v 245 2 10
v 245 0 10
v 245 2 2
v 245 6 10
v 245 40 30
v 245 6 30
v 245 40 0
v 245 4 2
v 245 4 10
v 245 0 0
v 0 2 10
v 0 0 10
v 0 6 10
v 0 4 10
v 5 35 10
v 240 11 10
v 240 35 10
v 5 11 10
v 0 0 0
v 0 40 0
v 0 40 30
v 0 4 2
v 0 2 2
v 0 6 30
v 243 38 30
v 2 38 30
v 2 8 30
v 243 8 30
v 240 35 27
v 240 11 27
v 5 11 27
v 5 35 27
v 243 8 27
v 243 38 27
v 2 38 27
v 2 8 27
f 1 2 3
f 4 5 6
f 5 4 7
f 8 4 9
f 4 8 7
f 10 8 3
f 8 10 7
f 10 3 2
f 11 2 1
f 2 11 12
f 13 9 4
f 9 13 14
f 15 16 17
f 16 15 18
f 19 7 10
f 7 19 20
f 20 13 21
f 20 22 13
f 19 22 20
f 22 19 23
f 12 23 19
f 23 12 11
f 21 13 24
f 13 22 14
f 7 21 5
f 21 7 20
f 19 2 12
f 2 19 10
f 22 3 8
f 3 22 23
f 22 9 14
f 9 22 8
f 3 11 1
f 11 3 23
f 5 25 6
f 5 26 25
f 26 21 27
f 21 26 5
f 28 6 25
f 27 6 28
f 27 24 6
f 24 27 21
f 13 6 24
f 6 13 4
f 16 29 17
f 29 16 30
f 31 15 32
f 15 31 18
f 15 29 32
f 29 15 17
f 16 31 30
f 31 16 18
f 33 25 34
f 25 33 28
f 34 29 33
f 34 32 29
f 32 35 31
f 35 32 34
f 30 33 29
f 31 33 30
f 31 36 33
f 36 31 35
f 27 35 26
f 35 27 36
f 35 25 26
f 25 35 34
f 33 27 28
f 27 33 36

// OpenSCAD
WideX=245;
DepthY=40;
HeightZ=10;
Thick=2;
Buff=1;
BoxH=30;
Wall=5;
Brim=2;
DBR=Brim*2;
Conn=Thick*3;

LidZ=3;
LidX=WideX-DBR;
LidY=DepthY-DBR-Conn;

DW=Wall*2;
DB=Buff*2;

difference()
{
  cube([WideX,DepthY,HeightZ]);
  translate([-Buff,Thick,Thick]) cube([WideX+DB,Thick,HeightZ]);
}
translate([0,Conn,0]) difference()
{
  cube([WideX,DepthY-Conn,BoxH]);
  translate([Wall,Wall,Wall]) cube([WideX-DW,DepthY-DW-Conn,BoxH]);
  translate([Brim,Brim,BoxH-LidZ]) cube([LidX,LidY,LidZ+Buff]);
}
